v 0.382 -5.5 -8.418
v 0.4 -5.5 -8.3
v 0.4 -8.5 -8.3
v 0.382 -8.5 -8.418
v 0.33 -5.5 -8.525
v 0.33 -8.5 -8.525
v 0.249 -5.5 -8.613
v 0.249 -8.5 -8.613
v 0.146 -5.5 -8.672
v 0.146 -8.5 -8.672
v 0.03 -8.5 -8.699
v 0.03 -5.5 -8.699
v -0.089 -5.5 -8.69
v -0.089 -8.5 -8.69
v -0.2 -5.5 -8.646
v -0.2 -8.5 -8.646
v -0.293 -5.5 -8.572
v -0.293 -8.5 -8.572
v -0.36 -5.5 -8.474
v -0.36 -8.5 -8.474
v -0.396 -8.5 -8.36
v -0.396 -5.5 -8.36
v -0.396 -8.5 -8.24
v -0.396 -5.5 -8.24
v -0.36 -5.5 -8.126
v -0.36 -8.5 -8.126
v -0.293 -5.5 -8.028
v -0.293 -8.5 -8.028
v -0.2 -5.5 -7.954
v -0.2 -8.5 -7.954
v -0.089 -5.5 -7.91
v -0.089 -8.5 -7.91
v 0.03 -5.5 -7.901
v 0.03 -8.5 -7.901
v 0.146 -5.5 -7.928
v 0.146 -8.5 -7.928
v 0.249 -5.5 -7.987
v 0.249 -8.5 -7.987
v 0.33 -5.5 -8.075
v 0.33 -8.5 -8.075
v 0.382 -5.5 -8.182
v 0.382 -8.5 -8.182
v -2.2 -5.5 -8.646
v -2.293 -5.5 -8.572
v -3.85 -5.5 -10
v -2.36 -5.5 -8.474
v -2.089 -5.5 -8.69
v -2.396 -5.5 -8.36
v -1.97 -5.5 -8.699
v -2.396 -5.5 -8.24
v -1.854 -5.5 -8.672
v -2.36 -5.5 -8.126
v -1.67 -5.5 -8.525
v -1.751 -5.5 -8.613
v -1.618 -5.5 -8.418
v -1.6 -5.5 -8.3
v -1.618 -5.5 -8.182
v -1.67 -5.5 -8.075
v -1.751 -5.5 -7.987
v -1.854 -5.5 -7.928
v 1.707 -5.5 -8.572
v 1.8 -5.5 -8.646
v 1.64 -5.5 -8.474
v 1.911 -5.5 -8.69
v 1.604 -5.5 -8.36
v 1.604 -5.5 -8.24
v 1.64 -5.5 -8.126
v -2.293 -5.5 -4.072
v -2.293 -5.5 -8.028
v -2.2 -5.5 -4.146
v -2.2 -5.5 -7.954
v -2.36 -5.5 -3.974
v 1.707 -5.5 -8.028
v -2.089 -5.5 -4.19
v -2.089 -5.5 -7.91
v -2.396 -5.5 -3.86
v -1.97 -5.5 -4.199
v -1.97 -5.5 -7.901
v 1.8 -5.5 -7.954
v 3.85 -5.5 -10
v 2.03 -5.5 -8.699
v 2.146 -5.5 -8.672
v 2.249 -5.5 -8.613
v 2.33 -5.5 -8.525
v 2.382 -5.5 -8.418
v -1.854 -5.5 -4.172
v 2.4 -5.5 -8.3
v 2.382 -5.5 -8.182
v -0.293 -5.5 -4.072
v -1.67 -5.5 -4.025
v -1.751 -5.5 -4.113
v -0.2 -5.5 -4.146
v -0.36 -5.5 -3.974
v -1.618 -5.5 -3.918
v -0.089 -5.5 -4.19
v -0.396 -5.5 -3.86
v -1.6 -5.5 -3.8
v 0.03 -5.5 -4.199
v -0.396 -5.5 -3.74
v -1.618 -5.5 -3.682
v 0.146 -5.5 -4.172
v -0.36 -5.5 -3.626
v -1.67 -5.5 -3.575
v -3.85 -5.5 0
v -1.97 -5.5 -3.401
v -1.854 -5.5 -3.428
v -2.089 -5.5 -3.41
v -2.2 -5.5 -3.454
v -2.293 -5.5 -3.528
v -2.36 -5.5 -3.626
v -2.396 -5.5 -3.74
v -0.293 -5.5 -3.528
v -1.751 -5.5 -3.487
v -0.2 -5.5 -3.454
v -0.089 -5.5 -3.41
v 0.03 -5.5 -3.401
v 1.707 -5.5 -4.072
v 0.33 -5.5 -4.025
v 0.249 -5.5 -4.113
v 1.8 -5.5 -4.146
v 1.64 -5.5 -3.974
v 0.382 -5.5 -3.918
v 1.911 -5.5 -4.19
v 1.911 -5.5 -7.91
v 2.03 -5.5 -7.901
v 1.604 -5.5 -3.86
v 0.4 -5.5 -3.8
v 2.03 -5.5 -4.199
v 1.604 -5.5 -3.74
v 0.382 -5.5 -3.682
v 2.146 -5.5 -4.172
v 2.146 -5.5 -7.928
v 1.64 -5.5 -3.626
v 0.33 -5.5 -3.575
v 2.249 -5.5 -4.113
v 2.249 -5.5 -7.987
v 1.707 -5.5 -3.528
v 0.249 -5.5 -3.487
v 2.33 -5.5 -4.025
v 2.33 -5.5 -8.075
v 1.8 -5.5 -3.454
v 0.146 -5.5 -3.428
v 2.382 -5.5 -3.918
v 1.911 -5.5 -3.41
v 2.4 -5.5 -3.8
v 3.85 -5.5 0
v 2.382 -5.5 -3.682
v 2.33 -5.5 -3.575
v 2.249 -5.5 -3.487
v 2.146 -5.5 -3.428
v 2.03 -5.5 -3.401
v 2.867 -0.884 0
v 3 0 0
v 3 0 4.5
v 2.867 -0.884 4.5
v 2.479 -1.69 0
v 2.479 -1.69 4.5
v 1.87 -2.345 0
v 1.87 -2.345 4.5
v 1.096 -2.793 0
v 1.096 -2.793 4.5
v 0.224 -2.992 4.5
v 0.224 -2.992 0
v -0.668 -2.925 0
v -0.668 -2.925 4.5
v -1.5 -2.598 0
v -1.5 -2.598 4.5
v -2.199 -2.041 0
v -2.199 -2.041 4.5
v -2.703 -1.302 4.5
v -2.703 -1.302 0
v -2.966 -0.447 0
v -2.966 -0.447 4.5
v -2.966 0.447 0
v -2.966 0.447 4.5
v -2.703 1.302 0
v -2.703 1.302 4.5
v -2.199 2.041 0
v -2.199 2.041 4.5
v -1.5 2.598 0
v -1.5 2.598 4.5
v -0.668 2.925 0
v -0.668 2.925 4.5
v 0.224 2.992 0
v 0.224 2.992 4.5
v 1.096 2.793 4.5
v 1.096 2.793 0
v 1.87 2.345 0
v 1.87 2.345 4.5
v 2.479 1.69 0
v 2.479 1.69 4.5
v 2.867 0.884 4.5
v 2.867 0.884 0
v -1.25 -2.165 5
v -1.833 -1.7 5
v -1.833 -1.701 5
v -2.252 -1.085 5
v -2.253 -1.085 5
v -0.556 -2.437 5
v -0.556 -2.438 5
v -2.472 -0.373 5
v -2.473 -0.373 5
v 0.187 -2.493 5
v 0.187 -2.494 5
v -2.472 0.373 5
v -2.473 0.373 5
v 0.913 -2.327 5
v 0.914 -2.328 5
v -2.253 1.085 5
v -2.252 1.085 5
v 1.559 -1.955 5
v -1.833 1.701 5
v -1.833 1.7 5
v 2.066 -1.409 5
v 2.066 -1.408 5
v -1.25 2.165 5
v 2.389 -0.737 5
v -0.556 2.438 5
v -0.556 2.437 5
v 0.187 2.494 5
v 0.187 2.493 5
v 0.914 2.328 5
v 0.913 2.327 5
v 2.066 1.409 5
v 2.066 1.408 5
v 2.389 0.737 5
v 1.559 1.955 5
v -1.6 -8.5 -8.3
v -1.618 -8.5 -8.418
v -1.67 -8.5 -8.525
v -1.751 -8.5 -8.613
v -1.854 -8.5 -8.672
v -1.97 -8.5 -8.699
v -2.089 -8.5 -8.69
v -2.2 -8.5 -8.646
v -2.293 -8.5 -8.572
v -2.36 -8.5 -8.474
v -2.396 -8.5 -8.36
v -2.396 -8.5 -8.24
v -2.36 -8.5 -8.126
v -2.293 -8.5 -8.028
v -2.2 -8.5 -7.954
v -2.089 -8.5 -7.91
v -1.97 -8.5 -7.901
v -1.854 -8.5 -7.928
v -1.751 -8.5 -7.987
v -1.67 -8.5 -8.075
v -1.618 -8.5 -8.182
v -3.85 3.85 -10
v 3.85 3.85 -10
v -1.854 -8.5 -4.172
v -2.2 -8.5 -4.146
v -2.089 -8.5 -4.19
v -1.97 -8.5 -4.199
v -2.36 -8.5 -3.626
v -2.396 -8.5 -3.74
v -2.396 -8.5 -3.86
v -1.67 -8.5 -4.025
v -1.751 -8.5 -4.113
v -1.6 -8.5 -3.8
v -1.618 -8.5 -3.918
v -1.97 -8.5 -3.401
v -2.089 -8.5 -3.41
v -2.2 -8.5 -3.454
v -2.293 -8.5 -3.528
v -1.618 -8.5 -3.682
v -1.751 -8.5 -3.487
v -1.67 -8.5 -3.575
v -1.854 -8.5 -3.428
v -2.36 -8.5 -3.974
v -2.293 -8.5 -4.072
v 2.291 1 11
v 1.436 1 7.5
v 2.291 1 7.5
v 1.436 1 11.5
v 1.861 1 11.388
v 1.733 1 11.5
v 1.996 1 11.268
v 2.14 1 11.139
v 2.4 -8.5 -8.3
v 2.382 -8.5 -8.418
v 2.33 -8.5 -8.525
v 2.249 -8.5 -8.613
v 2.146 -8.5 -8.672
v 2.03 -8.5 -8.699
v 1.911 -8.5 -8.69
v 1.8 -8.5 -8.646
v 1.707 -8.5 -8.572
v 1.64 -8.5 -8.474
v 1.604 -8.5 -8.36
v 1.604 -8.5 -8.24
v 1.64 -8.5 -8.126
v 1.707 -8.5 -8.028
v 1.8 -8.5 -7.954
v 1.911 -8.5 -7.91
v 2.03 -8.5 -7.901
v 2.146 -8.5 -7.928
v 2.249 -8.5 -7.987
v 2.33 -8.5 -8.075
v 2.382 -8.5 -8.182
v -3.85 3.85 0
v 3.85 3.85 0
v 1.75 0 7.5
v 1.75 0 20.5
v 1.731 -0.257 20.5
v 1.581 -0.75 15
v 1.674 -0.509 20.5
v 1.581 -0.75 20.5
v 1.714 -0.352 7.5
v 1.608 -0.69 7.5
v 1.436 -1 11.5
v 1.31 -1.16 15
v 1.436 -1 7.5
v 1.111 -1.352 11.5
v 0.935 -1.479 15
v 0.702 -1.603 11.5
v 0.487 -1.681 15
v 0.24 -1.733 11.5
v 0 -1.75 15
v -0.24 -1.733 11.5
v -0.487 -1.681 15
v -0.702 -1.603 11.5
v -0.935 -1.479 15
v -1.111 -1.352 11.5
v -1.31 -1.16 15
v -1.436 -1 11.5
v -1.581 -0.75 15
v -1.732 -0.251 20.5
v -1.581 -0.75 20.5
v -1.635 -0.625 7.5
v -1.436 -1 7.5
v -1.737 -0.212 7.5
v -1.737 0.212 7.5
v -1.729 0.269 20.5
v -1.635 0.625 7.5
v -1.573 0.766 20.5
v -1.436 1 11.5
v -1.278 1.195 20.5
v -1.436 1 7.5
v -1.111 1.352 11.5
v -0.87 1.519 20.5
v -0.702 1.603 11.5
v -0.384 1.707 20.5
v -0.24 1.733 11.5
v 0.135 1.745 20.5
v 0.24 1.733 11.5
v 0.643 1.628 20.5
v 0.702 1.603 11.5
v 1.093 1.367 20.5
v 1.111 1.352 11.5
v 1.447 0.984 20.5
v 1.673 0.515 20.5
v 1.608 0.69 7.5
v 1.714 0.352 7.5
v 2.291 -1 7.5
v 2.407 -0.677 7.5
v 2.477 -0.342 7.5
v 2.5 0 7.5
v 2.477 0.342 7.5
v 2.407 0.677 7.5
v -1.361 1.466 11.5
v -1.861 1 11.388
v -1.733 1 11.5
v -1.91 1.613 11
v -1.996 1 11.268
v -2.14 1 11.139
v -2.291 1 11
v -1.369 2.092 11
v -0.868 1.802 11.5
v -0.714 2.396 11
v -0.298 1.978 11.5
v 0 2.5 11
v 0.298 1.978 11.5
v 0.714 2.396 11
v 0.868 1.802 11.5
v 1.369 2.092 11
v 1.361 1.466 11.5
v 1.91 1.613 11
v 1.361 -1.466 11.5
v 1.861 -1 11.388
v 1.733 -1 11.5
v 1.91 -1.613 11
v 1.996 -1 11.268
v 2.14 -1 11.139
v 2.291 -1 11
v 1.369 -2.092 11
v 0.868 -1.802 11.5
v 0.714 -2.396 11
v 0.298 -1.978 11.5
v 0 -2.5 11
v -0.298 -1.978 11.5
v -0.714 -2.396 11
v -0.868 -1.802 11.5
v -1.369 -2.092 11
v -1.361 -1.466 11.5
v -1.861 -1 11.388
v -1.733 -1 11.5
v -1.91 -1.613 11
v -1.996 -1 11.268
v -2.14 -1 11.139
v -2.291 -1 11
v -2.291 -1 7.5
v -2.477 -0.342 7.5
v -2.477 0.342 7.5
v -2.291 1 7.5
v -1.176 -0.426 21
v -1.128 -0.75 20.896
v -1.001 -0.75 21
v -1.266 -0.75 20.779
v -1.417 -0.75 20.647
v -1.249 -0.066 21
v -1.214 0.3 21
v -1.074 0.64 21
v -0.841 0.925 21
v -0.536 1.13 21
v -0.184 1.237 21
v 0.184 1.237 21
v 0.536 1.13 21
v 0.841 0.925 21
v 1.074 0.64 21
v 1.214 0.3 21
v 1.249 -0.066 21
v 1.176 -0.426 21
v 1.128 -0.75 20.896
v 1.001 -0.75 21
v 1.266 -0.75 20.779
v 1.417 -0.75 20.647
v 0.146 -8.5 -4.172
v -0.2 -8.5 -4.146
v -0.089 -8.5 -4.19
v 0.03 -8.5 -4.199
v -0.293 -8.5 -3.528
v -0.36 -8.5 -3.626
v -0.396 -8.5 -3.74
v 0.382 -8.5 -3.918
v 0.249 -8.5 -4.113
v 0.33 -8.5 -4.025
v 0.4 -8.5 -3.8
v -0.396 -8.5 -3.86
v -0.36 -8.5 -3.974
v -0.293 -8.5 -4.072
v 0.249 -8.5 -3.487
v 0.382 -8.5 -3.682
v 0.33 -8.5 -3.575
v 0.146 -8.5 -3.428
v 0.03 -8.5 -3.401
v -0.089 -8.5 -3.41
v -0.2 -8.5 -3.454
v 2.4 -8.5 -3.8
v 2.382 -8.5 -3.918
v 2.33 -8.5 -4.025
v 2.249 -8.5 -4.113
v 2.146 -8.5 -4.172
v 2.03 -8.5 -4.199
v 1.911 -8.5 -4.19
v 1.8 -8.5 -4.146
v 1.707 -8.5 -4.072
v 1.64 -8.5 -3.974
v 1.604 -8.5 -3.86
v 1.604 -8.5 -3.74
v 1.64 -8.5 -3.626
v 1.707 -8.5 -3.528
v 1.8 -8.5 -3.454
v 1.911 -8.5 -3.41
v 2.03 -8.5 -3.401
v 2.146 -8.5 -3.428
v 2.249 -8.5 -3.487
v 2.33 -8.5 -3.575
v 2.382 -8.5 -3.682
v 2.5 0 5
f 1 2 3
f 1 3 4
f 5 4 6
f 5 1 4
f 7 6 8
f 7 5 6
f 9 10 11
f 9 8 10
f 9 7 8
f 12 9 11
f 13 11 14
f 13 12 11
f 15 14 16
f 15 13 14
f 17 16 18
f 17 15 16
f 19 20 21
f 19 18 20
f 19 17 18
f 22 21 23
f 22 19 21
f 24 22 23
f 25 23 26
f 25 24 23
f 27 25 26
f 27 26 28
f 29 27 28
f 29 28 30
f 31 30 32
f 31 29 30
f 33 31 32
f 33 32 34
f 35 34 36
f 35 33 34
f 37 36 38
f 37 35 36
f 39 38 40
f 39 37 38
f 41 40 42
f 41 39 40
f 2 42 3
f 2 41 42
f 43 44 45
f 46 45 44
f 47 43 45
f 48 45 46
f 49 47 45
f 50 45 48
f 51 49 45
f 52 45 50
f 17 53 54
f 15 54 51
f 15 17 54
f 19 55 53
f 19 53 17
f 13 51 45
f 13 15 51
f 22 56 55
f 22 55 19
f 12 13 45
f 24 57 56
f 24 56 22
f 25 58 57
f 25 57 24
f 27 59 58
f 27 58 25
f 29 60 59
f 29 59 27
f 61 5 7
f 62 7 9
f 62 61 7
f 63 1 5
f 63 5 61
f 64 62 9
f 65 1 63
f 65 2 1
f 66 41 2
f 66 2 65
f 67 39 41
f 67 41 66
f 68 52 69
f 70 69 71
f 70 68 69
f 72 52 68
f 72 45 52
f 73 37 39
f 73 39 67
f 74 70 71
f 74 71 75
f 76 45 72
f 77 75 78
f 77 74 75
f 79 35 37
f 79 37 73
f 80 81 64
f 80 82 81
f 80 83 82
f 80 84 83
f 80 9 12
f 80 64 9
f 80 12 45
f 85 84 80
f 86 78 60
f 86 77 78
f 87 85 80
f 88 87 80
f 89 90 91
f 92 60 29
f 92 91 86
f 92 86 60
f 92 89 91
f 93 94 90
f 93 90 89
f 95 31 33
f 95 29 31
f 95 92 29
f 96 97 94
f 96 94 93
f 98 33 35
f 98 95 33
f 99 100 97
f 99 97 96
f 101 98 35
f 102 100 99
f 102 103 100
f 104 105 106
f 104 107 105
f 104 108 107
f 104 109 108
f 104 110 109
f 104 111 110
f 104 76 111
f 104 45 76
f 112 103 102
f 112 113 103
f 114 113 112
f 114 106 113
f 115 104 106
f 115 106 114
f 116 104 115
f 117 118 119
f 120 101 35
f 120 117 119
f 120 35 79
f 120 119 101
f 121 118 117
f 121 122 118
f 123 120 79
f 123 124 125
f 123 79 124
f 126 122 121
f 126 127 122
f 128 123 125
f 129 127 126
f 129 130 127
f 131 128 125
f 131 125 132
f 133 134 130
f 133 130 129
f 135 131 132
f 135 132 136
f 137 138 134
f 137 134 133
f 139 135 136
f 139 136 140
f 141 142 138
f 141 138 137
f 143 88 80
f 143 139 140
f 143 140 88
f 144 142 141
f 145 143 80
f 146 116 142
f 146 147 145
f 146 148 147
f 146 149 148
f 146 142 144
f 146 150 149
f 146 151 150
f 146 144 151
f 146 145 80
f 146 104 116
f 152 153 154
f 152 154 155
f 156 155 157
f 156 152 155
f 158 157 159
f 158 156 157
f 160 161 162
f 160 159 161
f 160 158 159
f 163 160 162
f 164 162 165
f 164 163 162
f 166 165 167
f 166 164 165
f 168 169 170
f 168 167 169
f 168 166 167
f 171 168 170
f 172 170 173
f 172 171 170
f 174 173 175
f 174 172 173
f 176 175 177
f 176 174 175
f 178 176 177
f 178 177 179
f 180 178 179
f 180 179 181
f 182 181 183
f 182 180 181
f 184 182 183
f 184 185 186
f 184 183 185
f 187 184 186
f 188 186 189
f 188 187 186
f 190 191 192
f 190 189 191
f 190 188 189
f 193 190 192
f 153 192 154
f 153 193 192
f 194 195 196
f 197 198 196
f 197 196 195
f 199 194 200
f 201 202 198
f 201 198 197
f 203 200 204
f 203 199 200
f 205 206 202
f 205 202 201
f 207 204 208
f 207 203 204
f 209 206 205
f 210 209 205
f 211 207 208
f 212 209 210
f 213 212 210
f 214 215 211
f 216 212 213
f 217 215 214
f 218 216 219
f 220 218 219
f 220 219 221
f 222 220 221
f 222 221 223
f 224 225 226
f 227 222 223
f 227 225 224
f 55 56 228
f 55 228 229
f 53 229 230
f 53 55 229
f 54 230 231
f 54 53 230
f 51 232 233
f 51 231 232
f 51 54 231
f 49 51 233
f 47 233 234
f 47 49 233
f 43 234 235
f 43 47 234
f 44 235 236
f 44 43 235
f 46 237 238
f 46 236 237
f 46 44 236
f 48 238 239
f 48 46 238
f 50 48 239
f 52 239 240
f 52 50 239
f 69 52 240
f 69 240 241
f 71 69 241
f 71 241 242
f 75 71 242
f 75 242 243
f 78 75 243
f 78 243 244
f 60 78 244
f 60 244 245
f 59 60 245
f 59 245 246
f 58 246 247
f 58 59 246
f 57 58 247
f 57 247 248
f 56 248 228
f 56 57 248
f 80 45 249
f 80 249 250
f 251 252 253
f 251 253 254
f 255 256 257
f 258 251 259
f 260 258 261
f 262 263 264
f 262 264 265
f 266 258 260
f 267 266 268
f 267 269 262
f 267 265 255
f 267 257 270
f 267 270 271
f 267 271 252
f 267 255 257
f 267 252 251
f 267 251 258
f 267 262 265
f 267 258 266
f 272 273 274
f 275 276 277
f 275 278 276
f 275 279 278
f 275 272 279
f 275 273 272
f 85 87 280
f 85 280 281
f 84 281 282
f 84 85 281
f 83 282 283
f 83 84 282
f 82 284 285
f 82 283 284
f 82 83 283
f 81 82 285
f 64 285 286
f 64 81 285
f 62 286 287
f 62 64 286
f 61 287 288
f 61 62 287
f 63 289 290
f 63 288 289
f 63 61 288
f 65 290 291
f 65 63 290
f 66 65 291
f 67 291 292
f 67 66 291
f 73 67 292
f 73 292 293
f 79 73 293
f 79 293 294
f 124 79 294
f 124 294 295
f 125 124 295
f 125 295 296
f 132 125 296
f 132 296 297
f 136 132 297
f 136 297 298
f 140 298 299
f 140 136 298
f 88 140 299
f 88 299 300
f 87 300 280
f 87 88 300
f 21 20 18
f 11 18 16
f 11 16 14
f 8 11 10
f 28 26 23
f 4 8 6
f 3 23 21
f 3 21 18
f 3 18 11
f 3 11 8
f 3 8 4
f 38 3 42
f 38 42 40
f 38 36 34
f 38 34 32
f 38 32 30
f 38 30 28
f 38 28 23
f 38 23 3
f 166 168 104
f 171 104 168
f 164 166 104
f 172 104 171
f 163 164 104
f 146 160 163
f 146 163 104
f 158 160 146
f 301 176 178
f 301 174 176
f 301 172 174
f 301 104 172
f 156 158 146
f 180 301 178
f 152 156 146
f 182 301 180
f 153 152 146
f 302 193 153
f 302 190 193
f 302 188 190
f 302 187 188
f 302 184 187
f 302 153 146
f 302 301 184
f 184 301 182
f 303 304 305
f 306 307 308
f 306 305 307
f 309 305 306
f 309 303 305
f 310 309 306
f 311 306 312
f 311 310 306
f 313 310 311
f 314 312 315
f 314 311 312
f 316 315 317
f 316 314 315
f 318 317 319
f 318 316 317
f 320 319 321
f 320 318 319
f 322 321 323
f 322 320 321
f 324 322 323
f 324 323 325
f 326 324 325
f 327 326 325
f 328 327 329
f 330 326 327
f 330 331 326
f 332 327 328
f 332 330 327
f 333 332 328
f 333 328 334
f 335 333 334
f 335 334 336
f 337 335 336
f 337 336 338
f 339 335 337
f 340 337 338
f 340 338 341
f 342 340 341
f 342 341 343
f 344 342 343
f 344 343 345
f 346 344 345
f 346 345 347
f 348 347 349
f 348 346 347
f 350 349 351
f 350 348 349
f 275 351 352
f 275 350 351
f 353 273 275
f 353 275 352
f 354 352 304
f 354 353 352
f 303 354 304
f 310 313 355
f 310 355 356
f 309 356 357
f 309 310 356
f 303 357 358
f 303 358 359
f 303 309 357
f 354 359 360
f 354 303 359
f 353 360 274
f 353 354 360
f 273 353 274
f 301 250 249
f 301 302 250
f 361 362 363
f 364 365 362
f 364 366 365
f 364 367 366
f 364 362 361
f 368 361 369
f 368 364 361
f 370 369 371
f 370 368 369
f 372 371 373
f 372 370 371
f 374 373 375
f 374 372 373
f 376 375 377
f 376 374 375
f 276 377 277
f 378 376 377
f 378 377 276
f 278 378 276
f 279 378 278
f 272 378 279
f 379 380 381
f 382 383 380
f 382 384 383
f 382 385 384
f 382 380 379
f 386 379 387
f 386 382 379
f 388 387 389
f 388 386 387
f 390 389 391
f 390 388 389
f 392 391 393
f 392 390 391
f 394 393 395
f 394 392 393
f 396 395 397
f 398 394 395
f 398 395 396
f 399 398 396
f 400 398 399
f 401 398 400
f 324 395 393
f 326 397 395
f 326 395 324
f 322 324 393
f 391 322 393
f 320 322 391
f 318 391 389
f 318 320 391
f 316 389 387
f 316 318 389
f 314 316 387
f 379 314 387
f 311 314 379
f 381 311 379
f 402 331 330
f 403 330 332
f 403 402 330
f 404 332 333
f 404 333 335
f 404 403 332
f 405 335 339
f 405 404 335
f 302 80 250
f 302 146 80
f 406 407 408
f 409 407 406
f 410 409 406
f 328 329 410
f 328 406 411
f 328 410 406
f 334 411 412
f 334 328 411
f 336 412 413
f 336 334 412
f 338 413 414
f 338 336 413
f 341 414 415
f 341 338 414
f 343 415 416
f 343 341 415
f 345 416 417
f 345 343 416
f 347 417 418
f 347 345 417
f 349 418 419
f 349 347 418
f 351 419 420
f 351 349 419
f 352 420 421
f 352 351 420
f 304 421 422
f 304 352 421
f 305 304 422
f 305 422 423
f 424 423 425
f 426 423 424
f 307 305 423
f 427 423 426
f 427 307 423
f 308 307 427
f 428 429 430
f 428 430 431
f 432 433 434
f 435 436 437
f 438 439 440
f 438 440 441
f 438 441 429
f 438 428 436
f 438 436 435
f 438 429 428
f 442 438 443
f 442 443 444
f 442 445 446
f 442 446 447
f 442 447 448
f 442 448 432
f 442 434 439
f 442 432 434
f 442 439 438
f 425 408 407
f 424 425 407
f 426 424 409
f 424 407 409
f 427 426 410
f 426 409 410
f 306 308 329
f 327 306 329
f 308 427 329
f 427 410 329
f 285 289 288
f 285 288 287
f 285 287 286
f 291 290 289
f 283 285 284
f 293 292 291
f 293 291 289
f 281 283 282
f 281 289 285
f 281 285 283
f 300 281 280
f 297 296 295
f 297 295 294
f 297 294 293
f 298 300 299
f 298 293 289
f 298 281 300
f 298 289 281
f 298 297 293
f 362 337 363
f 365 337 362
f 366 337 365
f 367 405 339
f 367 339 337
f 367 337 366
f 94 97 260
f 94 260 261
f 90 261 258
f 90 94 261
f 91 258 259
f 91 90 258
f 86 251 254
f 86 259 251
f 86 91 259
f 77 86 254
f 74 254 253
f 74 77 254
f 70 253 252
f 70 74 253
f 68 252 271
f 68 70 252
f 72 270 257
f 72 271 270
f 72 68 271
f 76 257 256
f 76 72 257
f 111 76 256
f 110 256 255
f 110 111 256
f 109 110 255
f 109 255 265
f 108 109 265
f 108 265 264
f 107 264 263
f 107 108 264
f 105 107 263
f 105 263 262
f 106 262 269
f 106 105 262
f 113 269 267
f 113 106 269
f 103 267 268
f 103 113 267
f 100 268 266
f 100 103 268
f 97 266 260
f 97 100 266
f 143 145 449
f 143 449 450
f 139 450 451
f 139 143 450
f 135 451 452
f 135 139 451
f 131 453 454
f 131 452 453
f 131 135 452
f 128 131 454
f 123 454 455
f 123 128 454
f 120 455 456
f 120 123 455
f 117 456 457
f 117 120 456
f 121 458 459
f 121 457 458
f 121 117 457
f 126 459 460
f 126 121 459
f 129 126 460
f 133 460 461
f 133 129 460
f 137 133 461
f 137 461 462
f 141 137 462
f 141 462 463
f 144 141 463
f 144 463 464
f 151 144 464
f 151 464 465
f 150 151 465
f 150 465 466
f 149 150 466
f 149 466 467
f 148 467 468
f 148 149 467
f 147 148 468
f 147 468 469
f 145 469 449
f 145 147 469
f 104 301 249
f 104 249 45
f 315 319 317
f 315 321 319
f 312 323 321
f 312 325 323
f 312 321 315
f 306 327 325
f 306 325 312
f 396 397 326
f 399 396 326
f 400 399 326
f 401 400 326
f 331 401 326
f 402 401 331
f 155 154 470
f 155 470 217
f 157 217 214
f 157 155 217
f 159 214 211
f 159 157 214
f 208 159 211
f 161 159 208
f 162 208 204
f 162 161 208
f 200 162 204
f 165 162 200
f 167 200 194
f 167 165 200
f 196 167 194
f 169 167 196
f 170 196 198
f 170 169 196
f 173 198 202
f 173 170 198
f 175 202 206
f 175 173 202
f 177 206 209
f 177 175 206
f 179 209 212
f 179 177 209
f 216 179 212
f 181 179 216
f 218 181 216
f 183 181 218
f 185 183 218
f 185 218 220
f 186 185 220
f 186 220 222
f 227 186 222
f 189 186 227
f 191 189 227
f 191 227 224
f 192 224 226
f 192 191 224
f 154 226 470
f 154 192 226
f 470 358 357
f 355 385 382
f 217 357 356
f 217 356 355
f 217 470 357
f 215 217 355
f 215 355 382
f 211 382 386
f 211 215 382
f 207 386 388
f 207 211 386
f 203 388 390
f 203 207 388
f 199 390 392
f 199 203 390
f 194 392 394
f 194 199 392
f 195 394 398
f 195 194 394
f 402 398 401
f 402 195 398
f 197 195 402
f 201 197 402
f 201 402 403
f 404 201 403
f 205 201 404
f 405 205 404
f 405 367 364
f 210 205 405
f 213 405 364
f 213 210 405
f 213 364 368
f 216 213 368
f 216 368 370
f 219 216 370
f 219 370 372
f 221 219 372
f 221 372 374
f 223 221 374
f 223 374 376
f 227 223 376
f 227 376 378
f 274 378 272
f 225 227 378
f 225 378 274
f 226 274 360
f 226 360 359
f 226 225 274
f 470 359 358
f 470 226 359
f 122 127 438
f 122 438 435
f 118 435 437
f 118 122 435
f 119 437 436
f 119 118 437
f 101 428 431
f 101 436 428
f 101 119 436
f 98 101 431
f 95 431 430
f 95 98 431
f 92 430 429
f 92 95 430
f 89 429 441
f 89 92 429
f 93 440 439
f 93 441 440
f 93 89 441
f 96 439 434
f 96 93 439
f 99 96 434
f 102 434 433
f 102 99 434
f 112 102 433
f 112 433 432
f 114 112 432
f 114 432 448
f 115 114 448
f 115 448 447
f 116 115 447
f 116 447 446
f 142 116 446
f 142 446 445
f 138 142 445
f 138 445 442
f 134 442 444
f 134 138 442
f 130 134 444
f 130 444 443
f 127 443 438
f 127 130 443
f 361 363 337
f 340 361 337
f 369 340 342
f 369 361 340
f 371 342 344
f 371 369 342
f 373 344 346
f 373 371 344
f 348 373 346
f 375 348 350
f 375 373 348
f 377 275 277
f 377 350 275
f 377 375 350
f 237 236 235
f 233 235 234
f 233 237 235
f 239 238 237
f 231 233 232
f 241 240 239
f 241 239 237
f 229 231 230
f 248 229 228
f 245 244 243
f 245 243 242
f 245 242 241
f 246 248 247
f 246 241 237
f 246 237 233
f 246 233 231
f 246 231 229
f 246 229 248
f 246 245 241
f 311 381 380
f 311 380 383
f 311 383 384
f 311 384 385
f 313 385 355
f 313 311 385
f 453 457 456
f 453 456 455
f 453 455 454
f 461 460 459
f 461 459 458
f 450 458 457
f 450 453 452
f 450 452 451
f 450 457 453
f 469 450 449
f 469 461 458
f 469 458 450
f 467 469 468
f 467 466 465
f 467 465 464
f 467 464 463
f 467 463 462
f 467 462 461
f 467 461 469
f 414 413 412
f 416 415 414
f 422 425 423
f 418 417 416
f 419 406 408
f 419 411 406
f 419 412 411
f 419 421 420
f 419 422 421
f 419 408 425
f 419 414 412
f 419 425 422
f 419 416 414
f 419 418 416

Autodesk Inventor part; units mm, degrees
ref_plane "YZ Plane" through (0, 0, 0) normal (1, 0, 0) x (0, 1, 0)
ref_plane "XZ Plane" through (0, 0, 0) normal (0, 1, 0) x (-1, 0, 0)
ref_plane "XY Plane" through (0, 0, 0) normal (0, 0, 1) x (1, 0, 0)
sketch "Sketch1" plane through (0, 0, 0) normal (0, 0, 1) x (1, 0, 0)
  line L0 (3.85, 3.85) -> (-3.85, 3.85)
  line L1 (-3.85, 3.85) -> (-3.85, -5.5)
  line L2 (-3.85, -5.5) -> (3.85, -5.5)
  line L3 (3.85, -5.5) -> (3.85, 3.85)
  point P0 (0, 0)
  dimension "d0" = 7.7
  dimension "d1" = 3.85
  dimension "d2" = 3.85
  dimension "d3" = 5.5
extrude "Extrusion1" add sketch "Sketch1" against normal blind 10
sketch "Sketch2" plane through (0, 0, 0) normal (0, 0, 1) x (1, 0, 0)
  circle A0 centre (0, 0) radius 3
  dimension "d6" = 6
extrude "Extrusion2" add sketch "Sketch2" along normal blind 5
sketch "Sketch3" plane through (0, 0, 5) normal (0, 0, 1) x (1, 0, 0)
  circle A0 centre (0, 0) radius 3 projected
  circle A1 centre (0, 0) radius 2.5
  dimension "d9" = 5
extrude "Extrusion3" add sketch "Sketch3" along normal blind 6.5 contours A1
sketch "Sketch4" plane through (0, 0, 0) normal (1, 0, 0) x (0, 1, 0)
  line L0 (1, 13.5) -> (-1, 13.5)
  line L1 (-1, 13.5) -> (-1, 7.5)
  line L2 (-1, 7.5) -> (1, 7.5)
  line L3 (1, 7.5) -> (1, 13.5)
  line L4 (2.5, 11.5) -> (-2.5, 11.5) projected
  line L5 (0, 11.5) -> (1, 13.5) construction
  line L6 (0, 11.5) -> (-1, 13.5) construction
  point P0 (0, 0)
  dimension "d12" = 2
  dimension "d13" = 4
  dimension "d14" = 2
extrude "Extrusion4" cut sketch "Sketch4" along normal through all both and the other way through all
sketch "Sketch5" plane through (0, 0, 0) normal (0, 0, 1) x (1, 0, 0)
  circle A0 centre (0, 0) radius 3 projected
  circle A1 centre (0, 0) radius 1.75
  dimension "d17" = 3.5
extrude "Extrusion5" add sketch "Sketch5" along normal blind 21 contours A1
sketch "Sketch6" plane through (0, 0, 21) normal (0, 0, 1) x (1, 0, 0)
  circle A0 centre (0, 0) radius 1.75 projected
  line L0 (-2, -2.75) -> (2, -2.75)
  line L1 (2, -2.75) -> (2, -0.75)
  line L2 (2, -0.75) -> (-2, -0.75)
  line L3 (-2, -0.75) -> (-2, -2.75)
  dimension "d21" = 2.5
  dimension "d22" = 2
  dimension "d23" = 2
  dimension "d24" = 2
extrude "Extrusion6" cut sketch "Sketch6" against normal blind 6 contours L2 A0 | A0 L2 L1 L0 L3 picked at (0.0313, -1.2733)
chamfer "Chamfer1" distance 0.5 angle 45 5 edges at (1.7073, -0.3844, 21) (-0.3844, 1.7073, 21) (0, 2.5, 11.5) (0, -2.5, 11.5) (-3, 0, 5)
sketch "Sketch7" plane through (-3.85, -5.5, 0) normal (0, -1, 0) x (1, 0, 0)
  line L0 (0, 0) -> (7.7, 0) projected
  line L1 (0, 0) -> (0, -10) projected
  line L2 (7.7, -10) -> (0, -10) projected
  line L3 (7.7, 0) -> (7.7, -10) projected
  circle A0 centre (3.85, -3.8) radius 0.4
  circle A1 centre (3.85, -8.3) radius 0.4
  circle A2 centre (5.85, -3.8) radius 0.4
  circle A3 centre (5.85, -8.3) radius 0.4
  circle A4 centre (1.85, -8.3) radius 0.4
  circle A5 centre (1.85, -3.8) radius 0.4
  line L4 (3.85, -3.8) -> (1.85, -3.8) construction
  line L5 (1.85, -8.3) -> (1.85, -3.8) construction
  line L6 (1.85, -8.3) -> (3.85, -8.3) construction
  line L7 (3.85, -8.3) -> (5.85, -8.3) construction
  line L8 (5.85, -8.3) -> (5.85, -3.8) construction
  line L9 (5.85, -3.8) -> (3.85, -3.8) construction
  point P0 (3.85, 0)
  dimension "d30" = 0.8
  dimension "d31" = 3.8
  dimension "d32" = 4.5
  dimension "d33" = 2
  dimension "d34" = 2
  dimension "d37" = 3.85
  dimension "d38" = 1.7
extrude "Extrusion7" add sketch "Sketch7" along normal blind 3 contours A0 | A1 | A2 | A3 | A4 | A5
thread "Thread1" size "M6x0.75" class "6g" standard "ANSI Metric M Profile" full length
equation "\"d2\" = 0.5 * d0"
properties part number "P082D"
